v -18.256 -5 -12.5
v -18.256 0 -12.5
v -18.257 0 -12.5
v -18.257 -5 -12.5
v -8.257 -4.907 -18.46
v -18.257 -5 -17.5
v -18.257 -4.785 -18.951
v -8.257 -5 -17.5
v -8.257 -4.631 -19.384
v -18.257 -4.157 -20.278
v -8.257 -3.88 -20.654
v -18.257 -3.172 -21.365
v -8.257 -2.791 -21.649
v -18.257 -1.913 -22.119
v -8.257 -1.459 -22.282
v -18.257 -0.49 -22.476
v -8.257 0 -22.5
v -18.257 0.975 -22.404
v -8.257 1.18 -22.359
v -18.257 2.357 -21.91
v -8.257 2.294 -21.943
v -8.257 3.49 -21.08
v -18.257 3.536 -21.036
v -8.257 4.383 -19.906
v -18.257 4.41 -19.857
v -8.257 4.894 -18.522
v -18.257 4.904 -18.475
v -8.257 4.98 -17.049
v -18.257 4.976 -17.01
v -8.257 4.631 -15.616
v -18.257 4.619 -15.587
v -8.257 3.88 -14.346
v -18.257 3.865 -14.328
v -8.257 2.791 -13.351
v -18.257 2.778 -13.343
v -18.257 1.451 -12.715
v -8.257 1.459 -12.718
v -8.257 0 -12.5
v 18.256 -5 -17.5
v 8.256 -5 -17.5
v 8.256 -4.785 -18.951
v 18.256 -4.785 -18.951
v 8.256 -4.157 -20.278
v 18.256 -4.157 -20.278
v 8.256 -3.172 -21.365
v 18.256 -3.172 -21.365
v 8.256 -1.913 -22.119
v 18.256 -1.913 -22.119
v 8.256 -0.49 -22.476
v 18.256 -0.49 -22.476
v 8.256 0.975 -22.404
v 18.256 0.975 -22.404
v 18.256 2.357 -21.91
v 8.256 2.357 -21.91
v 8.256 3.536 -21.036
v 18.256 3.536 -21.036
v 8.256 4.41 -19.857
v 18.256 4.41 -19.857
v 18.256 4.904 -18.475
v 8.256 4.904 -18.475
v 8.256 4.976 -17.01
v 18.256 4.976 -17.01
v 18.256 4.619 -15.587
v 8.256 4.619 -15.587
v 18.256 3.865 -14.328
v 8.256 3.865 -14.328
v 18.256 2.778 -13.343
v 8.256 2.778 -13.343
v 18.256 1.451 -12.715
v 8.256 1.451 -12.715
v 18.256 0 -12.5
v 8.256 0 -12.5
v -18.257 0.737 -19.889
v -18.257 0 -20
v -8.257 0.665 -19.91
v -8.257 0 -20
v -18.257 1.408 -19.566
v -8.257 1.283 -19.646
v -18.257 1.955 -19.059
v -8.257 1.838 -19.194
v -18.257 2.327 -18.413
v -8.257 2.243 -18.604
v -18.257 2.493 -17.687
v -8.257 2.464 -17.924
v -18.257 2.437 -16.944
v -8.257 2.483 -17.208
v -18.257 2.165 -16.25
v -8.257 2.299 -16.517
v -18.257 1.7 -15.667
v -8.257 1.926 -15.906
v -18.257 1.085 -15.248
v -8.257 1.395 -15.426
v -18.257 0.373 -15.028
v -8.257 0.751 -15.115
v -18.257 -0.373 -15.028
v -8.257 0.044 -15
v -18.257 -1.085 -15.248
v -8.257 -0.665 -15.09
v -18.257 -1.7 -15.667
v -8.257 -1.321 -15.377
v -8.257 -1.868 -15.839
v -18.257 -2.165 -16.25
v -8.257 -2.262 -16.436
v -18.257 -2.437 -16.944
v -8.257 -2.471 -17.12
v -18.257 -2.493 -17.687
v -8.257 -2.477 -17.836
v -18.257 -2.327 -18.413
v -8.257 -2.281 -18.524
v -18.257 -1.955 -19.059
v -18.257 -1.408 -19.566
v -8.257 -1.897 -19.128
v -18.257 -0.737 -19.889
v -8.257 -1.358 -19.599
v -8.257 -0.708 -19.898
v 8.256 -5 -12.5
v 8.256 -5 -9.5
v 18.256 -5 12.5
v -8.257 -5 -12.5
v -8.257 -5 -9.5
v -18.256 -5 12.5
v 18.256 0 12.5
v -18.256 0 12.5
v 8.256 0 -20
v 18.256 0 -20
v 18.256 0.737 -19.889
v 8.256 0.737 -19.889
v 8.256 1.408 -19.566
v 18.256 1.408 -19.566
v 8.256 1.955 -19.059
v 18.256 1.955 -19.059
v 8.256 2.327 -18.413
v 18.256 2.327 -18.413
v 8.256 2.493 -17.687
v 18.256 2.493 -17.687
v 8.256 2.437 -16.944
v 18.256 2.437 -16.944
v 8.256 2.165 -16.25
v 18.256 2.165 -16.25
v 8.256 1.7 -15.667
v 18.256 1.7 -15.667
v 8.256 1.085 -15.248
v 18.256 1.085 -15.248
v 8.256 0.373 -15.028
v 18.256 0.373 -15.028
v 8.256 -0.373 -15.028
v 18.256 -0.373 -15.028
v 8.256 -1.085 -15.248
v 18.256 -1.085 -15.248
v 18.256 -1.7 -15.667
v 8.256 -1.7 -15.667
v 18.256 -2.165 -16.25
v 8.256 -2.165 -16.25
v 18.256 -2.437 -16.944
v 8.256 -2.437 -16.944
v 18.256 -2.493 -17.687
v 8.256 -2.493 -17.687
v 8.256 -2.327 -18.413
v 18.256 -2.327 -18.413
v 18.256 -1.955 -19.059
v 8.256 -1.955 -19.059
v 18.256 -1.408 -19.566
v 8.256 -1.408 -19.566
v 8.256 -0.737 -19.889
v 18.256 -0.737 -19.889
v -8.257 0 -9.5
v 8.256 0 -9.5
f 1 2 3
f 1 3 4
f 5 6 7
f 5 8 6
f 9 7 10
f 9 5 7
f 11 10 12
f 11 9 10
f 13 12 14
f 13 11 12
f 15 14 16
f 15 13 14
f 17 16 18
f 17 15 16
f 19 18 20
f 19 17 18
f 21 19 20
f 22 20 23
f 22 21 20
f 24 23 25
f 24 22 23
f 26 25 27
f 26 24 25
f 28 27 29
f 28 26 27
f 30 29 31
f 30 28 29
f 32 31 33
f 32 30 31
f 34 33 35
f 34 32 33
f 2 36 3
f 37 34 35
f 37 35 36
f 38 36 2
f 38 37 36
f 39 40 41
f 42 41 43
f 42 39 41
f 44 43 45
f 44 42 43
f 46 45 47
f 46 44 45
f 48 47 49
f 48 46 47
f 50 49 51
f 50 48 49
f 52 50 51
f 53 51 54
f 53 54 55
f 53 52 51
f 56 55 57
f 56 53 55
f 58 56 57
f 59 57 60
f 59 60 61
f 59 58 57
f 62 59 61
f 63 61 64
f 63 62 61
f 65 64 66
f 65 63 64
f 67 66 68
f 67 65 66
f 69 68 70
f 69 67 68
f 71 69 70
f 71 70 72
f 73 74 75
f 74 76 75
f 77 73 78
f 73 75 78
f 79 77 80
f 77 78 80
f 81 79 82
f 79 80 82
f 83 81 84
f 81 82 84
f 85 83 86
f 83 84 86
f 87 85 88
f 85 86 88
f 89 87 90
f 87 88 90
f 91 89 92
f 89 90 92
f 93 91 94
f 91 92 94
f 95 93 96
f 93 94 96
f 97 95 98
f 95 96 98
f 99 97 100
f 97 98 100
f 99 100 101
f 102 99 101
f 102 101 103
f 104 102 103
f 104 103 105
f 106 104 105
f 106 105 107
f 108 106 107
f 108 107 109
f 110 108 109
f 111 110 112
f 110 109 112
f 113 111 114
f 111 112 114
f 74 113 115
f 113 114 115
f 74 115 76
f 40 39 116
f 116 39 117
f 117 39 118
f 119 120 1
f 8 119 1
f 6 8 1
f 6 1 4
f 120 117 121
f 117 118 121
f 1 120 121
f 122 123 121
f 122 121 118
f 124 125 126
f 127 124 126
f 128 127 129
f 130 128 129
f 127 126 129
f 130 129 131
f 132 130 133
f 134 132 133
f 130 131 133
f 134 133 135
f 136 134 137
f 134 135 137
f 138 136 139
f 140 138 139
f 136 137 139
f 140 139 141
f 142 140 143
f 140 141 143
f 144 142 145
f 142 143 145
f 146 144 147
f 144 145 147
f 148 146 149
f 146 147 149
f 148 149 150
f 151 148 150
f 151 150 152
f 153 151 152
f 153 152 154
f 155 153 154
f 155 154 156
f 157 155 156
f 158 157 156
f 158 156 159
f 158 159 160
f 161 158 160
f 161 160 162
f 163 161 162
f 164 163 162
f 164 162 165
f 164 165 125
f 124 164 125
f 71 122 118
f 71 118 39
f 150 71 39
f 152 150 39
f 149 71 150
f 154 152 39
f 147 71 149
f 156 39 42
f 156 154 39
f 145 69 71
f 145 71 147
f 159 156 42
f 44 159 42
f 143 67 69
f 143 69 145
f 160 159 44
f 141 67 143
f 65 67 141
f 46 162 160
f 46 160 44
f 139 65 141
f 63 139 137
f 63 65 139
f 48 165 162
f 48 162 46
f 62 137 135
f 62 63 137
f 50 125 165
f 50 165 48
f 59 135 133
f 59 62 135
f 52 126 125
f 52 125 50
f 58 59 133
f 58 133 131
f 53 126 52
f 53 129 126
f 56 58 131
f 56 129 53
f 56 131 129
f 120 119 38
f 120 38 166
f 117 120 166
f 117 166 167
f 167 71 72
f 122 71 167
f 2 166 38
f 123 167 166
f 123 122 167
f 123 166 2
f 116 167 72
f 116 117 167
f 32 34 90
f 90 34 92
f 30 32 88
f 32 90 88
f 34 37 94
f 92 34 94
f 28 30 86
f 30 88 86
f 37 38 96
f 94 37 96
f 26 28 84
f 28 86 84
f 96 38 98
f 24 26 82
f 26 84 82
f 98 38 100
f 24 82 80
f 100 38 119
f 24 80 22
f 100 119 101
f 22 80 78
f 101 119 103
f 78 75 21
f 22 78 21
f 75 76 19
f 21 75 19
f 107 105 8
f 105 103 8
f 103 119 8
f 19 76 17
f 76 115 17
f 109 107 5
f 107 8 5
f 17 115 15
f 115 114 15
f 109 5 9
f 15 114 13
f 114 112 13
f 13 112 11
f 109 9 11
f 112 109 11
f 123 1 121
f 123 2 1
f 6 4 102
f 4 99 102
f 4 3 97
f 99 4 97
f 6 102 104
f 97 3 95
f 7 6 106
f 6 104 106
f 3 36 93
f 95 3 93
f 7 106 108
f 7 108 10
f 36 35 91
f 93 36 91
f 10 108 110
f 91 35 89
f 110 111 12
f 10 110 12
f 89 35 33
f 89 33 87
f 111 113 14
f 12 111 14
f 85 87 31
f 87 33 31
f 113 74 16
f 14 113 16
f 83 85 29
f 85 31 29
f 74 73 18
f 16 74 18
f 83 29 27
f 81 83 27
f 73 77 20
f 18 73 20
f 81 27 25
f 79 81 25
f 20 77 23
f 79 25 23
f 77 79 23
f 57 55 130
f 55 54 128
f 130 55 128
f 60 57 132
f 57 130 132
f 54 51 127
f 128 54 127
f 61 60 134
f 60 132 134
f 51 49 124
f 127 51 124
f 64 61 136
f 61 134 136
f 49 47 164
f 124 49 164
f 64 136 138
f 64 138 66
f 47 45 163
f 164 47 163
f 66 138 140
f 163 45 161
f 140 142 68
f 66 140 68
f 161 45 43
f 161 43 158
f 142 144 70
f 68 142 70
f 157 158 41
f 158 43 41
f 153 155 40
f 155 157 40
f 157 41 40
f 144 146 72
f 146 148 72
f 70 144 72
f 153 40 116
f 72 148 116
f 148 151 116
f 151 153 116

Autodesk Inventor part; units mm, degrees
ref_plane "YZ Plane" through (0, 0, 0) normal (1, 0, 0) x (0, 1, 0)
ref_plane "XZ Plane" through (0, 0, 0) normal (0, 1, 0) x (-1, 0, 0)
ref_plane "XY Plane" through (0, 0, 0) normal (0, 0, 1) x (1, 0, 0)
sketch "Sketch1" plane through (0, 0, 0) normal (0, 1, 0) x (-1, 0, 0)
  line L0 (-18.2563, -12.5) -> (18.2563, -12.5)
  line L1 (18.2563, -12.5) -> (18.2563, 12.5)
  line L2 (18.2563, 12.5) -> (-18.2563, 12.5)
  line L3 (-18.2563, 12.5) -> (-18.2563, -12.5)
  line L4 (-18.2563, -12.5) -> (18.2563, 12.5) construction
  line L5 (18.2563, -12.5) -> (-18.2563, 12.5) construction
  point P0 (0, 0)
  dimension "d0" = 36.5125
  dimension "d1" = 25
extrude "Extrusion1" add sketch "Sketch1" against normal blind 5
sketch "Sketch2" plane through (18.2563, 0, 12.5) normal (1, 0, 0) x (0, 0, -1)
  line L0 (25, 0) -> (25, -5) projected
  circle A0 centre (30, 0) radius 5
  line L1 (25, -5) -> (0, -5) projected
  line L2 (25, -5) -> (30, -5)
  line L3 (30, -5) -> (30, 0)
  line L4 (30, 0) -> (25, 0)
  line L5 (25, 0) -> (25, -5)
  point P0 (12.5, 0)
  dimension "d4" = 5
  dimension "d5" = 5
extrude "Extrusion2" add sketch "Sketch2" against normal blind 36.513
sketch "Sketch3" plane through (18.2563, -5, 12.5) normal (1, 0, 0) x (0, 0, -1)
  circle A0 centre (30, 5) radius 2.5
  line L0 (0, 5) -> (25, 5) projected
  point P0 (12.5, 5)
  dimension "d8" = 0
  dimension "d9" = 5
  dimension "d10" = 5
extrude "Extrusion3" cut sketch "Sketch3" against normal blind 36.513
sketch "Sketch4" plane through (0, -5, 0) normal (0, -1, 0) x (1, 0, 0)
  line L0 (18.2563, -12.5) -> (-18.2563, -12.5) projected
  line L1 (18.2563, -22.5) -> (-18.2567, -22.5) projected
  line L2 (8.2563, -12.5) -> (-8.2568, -12.5)
  line L3 (-8.2568, -12.5) -> (-8.2567, -22.5)
  line L4 (-8.2567, -22.5) -> (8.2563, -22.5)
  line L5 (8.2563, -22.5) -> (8.2563, -12.5)
  line L6 (18.2563, -22.5) -> (18.2563, -12.5) projected
  line L7 (-18.2567, -12.5) -> (-18.2567, -22.5) projected
  line L8 (8.2563, -12.5) -> (-8.2567, -12.5)
  line L9 (-8.2567, -12.5) -> (-8.2567, -9.5)
  line L10 (-8.2567, -9.5) -> (8.2562, -9.5)
  line L11 (8.2562, -9.5) -> (8.2563, -12.5)
  point P0 (0, 0)
  point P1 (18.2563, -17.5)
  point P2 (-18.2567, -17.5)
  point P3 (8.2562, -11)
  dimension "d13" = 10
  dimension "d14" = 10
  dimension "d15" = 3
  dimension "d16" = 16.513
extrude "Extrusion4" cut sketch "Sketch4" against normal blind 36.513 contours L5 L1 L3 L0 | L0 L9 L10 L11
properties part number "hinge 1" material "Stainless Steel"
